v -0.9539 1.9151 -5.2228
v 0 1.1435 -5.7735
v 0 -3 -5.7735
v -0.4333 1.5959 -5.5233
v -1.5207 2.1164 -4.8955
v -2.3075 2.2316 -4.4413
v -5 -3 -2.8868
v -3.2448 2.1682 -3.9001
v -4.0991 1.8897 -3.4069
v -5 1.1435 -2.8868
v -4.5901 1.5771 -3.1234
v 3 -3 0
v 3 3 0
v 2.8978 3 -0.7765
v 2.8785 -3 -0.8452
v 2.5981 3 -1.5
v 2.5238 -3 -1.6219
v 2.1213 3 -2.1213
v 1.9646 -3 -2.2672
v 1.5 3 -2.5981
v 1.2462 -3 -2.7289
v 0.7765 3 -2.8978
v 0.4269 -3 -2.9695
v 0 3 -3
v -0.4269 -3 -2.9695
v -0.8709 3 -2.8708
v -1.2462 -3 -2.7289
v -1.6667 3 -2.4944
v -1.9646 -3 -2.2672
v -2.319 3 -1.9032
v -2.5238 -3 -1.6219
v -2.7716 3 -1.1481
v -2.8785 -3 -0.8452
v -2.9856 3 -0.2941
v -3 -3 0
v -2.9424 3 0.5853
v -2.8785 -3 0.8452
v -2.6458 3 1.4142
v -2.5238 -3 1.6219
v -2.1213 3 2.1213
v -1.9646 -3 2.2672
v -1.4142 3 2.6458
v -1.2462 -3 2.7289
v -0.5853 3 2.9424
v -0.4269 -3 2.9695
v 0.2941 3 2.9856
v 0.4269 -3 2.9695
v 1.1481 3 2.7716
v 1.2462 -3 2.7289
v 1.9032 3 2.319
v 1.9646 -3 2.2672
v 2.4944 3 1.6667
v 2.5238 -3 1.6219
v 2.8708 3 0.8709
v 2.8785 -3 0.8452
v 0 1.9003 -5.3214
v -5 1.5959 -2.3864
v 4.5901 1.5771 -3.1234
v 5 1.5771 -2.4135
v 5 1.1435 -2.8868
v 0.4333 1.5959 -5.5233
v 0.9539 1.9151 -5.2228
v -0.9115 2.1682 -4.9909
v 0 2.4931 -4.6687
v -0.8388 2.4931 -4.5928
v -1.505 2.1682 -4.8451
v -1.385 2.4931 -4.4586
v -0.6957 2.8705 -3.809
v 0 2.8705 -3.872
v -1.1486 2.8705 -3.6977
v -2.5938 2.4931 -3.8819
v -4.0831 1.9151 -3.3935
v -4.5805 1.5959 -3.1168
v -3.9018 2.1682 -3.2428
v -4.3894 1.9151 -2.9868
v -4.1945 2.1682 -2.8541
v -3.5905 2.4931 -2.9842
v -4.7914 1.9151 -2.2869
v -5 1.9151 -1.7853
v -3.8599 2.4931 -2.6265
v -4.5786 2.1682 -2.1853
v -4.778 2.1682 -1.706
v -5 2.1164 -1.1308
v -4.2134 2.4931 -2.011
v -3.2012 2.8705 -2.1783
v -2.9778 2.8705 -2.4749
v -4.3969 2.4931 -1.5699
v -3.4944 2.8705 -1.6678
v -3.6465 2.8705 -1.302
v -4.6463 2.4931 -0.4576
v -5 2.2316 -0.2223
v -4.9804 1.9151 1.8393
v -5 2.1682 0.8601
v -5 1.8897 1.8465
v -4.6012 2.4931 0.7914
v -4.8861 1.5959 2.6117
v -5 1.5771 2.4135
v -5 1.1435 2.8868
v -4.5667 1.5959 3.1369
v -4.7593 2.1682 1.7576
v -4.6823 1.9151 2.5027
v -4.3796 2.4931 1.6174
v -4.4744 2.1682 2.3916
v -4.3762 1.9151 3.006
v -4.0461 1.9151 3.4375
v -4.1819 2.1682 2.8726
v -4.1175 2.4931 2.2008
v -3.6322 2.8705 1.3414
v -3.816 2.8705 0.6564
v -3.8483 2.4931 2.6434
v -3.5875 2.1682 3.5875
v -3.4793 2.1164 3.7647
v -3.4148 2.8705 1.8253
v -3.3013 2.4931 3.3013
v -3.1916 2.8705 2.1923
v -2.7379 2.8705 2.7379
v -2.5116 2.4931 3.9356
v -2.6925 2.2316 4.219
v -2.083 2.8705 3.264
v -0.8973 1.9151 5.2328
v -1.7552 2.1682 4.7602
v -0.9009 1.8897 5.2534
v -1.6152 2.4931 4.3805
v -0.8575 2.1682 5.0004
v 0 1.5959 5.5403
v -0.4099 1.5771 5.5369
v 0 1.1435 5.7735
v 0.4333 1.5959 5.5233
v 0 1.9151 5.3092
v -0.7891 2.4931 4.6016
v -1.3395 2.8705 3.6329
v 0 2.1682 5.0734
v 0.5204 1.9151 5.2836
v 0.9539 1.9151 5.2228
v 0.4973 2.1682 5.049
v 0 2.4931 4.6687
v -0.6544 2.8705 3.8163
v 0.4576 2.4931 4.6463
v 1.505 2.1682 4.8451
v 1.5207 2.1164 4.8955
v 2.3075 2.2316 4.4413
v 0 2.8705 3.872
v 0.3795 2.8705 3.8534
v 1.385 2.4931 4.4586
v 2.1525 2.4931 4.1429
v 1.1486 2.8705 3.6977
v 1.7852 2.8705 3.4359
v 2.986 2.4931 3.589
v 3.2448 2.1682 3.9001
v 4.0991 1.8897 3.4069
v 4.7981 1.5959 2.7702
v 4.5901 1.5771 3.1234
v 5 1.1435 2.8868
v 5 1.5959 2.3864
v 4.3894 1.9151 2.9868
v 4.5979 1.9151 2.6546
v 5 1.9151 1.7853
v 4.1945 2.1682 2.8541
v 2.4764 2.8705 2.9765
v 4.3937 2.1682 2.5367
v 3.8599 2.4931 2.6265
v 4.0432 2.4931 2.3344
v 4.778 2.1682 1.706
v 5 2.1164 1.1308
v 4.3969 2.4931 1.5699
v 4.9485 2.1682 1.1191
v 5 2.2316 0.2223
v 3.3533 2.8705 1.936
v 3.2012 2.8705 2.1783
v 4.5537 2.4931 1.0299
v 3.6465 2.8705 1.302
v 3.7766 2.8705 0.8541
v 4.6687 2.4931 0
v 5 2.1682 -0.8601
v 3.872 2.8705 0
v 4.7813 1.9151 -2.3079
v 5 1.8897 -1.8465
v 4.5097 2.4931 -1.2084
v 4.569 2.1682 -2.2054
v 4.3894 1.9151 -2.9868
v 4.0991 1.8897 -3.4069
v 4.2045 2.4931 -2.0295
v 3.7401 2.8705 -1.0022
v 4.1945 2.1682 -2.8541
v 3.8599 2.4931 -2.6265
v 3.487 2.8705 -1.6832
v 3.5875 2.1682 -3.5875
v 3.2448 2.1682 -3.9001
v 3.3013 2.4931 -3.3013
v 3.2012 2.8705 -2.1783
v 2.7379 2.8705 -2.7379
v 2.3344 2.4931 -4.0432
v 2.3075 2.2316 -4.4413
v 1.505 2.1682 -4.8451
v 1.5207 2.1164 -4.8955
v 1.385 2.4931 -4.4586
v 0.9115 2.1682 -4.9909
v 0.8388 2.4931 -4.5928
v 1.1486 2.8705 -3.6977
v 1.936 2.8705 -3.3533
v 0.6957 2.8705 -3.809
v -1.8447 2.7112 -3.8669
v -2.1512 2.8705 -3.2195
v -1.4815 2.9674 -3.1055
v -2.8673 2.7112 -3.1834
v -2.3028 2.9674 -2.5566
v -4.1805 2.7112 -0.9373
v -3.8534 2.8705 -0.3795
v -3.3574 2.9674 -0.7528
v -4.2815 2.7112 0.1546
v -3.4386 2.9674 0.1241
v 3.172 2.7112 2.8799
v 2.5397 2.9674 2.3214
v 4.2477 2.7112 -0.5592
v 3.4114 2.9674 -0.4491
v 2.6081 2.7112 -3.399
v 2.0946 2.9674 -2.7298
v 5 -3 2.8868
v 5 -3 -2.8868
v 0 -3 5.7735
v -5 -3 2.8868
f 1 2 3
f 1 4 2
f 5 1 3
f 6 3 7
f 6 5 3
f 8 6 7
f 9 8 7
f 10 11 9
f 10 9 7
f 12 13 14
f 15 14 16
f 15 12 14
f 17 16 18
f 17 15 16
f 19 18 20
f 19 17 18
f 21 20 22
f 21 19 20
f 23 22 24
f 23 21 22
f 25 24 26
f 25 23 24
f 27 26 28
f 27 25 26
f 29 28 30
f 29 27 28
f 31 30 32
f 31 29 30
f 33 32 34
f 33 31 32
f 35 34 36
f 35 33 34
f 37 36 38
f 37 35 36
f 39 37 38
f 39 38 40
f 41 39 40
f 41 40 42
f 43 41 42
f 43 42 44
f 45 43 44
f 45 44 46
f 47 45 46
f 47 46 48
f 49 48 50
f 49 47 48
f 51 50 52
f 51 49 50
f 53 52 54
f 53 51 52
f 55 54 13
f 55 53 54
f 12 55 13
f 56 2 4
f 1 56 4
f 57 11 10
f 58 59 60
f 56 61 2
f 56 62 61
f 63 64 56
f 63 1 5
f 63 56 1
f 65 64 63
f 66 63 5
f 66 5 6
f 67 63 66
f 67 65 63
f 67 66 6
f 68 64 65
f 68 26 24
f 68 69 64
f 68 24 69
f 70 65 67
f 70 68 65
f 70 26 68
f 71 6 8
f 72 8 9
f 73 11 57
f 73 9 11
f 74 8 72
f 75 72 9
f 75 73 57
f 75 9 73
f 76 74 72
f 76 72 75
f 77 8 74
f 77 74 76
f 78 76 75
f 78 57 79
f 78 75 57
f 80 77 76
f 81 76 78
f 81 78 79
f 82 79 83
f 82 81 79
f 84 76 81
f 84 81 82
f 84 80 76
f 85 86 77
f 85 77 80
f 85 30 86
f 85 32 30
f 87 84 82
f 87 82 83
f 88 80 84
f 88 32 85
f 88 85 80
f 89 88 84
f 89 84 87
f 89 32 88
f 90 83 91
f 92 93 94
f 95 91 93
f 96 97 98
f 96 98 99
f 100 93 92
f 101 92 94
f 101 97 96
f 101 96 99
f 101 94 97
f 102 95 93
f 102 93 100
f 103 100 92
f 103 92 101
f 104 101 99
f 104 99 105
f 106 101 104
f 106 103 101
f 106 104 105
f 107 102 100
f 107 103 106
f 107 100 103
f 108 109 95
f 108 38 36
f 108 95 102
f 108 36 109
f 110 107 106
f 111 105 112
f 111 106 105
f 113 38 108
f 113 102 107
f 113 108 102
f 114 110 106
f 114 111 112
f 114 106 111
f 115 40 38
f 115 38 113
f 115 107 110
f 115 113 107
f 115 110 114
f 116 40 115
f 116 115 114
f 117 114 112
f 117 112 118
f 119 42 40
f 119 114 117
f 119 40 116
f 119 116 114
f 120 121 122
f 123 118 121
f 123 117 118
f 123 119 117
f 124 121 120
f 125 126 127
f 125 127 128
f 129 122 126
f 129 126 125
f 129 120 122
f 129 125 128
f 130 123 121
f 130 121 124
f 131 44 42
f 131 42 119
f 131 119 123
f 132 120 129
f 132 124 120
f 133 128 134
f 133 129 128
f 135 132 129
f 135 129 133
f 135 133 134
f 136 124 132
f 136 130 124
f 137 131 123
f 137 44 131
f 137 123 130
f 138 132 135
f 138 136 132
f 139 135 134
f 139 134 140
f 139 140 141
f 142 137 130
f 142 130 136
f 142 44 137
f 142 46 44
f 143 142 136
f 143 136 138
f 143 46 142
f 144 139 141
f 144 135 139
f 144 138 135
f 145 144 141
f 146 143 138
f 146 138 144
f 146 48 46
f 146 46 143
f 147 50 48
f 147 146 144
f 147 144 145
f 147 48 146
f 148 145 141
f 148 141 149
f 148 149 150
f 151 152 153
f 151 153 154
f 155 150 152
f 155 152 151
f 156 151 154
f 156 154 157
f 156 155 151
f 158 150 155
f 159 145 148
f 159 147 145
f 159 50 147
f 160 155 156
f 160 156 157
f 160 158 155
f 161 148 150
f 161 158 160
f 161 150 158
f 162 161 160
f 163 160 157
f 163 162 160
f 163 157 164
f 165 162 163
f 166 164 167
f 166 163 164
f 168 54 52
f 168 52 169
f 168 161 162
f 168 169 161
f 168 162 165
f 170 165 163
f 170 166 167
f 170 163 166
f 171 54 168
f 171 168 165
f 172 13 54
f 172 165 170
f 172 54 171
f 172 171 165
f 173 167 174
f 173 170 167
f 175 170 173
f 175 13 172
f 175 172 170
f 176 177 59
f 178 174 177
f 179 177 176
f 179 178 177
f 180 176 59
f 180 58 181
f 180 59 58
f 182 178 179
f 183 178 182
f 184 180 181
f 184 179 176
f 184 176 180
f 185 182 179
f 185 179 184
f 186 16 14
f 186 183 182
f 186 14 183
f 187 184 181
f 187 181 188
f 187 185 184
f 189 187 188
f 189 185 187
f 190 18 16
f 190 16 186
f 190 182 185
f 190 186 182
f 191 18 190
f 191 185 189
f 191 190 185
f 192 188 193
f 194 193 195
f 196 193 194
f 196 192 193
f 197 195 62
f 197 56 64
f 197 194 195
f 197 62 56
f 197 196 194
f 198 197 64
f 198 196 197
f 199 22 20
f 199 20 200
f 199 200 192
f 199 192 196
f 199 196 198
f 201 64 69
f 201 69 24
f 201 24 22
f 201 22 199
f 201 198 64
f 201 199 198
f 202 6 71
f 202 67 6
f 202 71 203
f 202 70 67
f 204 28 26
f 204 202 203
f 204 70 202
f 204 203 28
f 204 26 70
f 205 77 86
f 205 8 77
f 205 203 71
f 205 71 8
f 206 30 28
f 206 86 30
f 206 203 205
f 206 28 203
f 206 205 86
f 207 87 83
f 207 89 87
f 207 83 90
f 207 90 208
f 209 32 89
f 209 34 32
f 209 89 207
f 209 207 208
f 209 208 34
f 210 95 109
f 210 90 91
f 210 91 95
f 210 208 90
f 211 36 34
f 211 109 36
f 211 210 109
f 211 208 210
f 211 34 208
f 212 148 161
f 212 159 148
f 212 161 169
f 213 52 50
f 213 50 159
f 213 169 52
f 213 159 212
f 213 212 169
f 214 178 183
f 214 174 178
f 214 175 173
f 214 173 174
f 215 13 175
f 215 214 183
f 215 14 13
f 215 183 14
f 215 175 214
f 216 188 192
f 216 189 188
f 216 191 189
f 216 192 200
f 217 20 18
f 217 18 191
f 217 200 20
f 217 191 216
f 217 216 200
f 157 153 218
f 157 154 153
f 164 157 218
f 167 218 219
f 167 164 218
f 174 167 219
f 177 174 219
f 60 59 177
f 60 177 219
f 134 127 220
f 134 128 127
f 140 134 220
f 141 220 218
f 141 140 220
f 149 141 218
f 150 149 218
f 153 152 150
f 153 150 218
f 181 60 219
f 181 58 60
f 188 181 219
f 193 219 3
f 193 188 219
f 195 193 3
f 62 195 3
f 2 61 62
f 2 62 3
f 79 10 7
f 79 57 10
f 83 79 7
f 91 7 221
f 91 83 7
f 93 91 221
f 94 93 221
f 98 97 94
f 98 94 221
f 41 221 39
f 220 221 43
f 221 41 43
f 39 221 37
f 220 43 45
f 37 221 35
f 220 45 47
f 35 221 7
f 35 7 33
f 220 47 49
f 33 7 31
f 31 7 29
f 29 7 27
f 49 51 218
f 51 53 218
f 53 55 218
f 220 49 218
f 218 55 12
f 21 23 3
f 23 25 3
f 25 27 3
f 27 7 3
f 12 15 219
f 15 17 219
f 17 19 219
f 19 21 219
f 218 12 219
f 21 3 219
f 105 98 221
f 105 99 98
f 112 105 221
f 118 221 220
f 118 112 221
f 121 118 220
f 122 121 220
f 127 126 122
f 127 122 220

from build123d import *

# Parameters (mm, degrees)
SKETCH3_R           = 3
BOSS_EXTRUDE1_DEPTH = 3


with BuildPart() as part:
    # Sketch3 → Boss-Extrude1 (new, symmetric)
    with BuildSketch(Plane(origin=(0, 0, 0), x_dir=(1, 0, 0), z_dir=(0, 1, 0))):
        Polygon((5, 2.886751346), (0, 5.773502692), (-5, 2.886751346), (-5, -2.886751346), (0, -5.773502692), (5, -2.886751346), align=None)
        Circle(SKETCH3_R, mode=Mode.SUBTRACT)
    extrude(amount=BOSS_EXTRUDE1_DEPTH, both=True)

    # Sketch5 → Cut-Revolve1 (revolve, cut)
    with BuildSketch(Plane(origin=(0, 0, 0), x_dir=(0, 0, -1), z_dir=(1, 0, 0))):
        with BuildLine():
            Line((3, 3), (5.773502692, 3))
            Line((5.773502692, 3), (5.773502692, 1.143539601))
            ThreePointArc((5.773502692, 1.143539601), (4.668739224, 2.493052226), (3, 3))
        make_face()
    revolve(axis=Axis((0, 0, 0), (0, 1, 0)), mode=Mode.SUBTRACT)


solid = part.part
